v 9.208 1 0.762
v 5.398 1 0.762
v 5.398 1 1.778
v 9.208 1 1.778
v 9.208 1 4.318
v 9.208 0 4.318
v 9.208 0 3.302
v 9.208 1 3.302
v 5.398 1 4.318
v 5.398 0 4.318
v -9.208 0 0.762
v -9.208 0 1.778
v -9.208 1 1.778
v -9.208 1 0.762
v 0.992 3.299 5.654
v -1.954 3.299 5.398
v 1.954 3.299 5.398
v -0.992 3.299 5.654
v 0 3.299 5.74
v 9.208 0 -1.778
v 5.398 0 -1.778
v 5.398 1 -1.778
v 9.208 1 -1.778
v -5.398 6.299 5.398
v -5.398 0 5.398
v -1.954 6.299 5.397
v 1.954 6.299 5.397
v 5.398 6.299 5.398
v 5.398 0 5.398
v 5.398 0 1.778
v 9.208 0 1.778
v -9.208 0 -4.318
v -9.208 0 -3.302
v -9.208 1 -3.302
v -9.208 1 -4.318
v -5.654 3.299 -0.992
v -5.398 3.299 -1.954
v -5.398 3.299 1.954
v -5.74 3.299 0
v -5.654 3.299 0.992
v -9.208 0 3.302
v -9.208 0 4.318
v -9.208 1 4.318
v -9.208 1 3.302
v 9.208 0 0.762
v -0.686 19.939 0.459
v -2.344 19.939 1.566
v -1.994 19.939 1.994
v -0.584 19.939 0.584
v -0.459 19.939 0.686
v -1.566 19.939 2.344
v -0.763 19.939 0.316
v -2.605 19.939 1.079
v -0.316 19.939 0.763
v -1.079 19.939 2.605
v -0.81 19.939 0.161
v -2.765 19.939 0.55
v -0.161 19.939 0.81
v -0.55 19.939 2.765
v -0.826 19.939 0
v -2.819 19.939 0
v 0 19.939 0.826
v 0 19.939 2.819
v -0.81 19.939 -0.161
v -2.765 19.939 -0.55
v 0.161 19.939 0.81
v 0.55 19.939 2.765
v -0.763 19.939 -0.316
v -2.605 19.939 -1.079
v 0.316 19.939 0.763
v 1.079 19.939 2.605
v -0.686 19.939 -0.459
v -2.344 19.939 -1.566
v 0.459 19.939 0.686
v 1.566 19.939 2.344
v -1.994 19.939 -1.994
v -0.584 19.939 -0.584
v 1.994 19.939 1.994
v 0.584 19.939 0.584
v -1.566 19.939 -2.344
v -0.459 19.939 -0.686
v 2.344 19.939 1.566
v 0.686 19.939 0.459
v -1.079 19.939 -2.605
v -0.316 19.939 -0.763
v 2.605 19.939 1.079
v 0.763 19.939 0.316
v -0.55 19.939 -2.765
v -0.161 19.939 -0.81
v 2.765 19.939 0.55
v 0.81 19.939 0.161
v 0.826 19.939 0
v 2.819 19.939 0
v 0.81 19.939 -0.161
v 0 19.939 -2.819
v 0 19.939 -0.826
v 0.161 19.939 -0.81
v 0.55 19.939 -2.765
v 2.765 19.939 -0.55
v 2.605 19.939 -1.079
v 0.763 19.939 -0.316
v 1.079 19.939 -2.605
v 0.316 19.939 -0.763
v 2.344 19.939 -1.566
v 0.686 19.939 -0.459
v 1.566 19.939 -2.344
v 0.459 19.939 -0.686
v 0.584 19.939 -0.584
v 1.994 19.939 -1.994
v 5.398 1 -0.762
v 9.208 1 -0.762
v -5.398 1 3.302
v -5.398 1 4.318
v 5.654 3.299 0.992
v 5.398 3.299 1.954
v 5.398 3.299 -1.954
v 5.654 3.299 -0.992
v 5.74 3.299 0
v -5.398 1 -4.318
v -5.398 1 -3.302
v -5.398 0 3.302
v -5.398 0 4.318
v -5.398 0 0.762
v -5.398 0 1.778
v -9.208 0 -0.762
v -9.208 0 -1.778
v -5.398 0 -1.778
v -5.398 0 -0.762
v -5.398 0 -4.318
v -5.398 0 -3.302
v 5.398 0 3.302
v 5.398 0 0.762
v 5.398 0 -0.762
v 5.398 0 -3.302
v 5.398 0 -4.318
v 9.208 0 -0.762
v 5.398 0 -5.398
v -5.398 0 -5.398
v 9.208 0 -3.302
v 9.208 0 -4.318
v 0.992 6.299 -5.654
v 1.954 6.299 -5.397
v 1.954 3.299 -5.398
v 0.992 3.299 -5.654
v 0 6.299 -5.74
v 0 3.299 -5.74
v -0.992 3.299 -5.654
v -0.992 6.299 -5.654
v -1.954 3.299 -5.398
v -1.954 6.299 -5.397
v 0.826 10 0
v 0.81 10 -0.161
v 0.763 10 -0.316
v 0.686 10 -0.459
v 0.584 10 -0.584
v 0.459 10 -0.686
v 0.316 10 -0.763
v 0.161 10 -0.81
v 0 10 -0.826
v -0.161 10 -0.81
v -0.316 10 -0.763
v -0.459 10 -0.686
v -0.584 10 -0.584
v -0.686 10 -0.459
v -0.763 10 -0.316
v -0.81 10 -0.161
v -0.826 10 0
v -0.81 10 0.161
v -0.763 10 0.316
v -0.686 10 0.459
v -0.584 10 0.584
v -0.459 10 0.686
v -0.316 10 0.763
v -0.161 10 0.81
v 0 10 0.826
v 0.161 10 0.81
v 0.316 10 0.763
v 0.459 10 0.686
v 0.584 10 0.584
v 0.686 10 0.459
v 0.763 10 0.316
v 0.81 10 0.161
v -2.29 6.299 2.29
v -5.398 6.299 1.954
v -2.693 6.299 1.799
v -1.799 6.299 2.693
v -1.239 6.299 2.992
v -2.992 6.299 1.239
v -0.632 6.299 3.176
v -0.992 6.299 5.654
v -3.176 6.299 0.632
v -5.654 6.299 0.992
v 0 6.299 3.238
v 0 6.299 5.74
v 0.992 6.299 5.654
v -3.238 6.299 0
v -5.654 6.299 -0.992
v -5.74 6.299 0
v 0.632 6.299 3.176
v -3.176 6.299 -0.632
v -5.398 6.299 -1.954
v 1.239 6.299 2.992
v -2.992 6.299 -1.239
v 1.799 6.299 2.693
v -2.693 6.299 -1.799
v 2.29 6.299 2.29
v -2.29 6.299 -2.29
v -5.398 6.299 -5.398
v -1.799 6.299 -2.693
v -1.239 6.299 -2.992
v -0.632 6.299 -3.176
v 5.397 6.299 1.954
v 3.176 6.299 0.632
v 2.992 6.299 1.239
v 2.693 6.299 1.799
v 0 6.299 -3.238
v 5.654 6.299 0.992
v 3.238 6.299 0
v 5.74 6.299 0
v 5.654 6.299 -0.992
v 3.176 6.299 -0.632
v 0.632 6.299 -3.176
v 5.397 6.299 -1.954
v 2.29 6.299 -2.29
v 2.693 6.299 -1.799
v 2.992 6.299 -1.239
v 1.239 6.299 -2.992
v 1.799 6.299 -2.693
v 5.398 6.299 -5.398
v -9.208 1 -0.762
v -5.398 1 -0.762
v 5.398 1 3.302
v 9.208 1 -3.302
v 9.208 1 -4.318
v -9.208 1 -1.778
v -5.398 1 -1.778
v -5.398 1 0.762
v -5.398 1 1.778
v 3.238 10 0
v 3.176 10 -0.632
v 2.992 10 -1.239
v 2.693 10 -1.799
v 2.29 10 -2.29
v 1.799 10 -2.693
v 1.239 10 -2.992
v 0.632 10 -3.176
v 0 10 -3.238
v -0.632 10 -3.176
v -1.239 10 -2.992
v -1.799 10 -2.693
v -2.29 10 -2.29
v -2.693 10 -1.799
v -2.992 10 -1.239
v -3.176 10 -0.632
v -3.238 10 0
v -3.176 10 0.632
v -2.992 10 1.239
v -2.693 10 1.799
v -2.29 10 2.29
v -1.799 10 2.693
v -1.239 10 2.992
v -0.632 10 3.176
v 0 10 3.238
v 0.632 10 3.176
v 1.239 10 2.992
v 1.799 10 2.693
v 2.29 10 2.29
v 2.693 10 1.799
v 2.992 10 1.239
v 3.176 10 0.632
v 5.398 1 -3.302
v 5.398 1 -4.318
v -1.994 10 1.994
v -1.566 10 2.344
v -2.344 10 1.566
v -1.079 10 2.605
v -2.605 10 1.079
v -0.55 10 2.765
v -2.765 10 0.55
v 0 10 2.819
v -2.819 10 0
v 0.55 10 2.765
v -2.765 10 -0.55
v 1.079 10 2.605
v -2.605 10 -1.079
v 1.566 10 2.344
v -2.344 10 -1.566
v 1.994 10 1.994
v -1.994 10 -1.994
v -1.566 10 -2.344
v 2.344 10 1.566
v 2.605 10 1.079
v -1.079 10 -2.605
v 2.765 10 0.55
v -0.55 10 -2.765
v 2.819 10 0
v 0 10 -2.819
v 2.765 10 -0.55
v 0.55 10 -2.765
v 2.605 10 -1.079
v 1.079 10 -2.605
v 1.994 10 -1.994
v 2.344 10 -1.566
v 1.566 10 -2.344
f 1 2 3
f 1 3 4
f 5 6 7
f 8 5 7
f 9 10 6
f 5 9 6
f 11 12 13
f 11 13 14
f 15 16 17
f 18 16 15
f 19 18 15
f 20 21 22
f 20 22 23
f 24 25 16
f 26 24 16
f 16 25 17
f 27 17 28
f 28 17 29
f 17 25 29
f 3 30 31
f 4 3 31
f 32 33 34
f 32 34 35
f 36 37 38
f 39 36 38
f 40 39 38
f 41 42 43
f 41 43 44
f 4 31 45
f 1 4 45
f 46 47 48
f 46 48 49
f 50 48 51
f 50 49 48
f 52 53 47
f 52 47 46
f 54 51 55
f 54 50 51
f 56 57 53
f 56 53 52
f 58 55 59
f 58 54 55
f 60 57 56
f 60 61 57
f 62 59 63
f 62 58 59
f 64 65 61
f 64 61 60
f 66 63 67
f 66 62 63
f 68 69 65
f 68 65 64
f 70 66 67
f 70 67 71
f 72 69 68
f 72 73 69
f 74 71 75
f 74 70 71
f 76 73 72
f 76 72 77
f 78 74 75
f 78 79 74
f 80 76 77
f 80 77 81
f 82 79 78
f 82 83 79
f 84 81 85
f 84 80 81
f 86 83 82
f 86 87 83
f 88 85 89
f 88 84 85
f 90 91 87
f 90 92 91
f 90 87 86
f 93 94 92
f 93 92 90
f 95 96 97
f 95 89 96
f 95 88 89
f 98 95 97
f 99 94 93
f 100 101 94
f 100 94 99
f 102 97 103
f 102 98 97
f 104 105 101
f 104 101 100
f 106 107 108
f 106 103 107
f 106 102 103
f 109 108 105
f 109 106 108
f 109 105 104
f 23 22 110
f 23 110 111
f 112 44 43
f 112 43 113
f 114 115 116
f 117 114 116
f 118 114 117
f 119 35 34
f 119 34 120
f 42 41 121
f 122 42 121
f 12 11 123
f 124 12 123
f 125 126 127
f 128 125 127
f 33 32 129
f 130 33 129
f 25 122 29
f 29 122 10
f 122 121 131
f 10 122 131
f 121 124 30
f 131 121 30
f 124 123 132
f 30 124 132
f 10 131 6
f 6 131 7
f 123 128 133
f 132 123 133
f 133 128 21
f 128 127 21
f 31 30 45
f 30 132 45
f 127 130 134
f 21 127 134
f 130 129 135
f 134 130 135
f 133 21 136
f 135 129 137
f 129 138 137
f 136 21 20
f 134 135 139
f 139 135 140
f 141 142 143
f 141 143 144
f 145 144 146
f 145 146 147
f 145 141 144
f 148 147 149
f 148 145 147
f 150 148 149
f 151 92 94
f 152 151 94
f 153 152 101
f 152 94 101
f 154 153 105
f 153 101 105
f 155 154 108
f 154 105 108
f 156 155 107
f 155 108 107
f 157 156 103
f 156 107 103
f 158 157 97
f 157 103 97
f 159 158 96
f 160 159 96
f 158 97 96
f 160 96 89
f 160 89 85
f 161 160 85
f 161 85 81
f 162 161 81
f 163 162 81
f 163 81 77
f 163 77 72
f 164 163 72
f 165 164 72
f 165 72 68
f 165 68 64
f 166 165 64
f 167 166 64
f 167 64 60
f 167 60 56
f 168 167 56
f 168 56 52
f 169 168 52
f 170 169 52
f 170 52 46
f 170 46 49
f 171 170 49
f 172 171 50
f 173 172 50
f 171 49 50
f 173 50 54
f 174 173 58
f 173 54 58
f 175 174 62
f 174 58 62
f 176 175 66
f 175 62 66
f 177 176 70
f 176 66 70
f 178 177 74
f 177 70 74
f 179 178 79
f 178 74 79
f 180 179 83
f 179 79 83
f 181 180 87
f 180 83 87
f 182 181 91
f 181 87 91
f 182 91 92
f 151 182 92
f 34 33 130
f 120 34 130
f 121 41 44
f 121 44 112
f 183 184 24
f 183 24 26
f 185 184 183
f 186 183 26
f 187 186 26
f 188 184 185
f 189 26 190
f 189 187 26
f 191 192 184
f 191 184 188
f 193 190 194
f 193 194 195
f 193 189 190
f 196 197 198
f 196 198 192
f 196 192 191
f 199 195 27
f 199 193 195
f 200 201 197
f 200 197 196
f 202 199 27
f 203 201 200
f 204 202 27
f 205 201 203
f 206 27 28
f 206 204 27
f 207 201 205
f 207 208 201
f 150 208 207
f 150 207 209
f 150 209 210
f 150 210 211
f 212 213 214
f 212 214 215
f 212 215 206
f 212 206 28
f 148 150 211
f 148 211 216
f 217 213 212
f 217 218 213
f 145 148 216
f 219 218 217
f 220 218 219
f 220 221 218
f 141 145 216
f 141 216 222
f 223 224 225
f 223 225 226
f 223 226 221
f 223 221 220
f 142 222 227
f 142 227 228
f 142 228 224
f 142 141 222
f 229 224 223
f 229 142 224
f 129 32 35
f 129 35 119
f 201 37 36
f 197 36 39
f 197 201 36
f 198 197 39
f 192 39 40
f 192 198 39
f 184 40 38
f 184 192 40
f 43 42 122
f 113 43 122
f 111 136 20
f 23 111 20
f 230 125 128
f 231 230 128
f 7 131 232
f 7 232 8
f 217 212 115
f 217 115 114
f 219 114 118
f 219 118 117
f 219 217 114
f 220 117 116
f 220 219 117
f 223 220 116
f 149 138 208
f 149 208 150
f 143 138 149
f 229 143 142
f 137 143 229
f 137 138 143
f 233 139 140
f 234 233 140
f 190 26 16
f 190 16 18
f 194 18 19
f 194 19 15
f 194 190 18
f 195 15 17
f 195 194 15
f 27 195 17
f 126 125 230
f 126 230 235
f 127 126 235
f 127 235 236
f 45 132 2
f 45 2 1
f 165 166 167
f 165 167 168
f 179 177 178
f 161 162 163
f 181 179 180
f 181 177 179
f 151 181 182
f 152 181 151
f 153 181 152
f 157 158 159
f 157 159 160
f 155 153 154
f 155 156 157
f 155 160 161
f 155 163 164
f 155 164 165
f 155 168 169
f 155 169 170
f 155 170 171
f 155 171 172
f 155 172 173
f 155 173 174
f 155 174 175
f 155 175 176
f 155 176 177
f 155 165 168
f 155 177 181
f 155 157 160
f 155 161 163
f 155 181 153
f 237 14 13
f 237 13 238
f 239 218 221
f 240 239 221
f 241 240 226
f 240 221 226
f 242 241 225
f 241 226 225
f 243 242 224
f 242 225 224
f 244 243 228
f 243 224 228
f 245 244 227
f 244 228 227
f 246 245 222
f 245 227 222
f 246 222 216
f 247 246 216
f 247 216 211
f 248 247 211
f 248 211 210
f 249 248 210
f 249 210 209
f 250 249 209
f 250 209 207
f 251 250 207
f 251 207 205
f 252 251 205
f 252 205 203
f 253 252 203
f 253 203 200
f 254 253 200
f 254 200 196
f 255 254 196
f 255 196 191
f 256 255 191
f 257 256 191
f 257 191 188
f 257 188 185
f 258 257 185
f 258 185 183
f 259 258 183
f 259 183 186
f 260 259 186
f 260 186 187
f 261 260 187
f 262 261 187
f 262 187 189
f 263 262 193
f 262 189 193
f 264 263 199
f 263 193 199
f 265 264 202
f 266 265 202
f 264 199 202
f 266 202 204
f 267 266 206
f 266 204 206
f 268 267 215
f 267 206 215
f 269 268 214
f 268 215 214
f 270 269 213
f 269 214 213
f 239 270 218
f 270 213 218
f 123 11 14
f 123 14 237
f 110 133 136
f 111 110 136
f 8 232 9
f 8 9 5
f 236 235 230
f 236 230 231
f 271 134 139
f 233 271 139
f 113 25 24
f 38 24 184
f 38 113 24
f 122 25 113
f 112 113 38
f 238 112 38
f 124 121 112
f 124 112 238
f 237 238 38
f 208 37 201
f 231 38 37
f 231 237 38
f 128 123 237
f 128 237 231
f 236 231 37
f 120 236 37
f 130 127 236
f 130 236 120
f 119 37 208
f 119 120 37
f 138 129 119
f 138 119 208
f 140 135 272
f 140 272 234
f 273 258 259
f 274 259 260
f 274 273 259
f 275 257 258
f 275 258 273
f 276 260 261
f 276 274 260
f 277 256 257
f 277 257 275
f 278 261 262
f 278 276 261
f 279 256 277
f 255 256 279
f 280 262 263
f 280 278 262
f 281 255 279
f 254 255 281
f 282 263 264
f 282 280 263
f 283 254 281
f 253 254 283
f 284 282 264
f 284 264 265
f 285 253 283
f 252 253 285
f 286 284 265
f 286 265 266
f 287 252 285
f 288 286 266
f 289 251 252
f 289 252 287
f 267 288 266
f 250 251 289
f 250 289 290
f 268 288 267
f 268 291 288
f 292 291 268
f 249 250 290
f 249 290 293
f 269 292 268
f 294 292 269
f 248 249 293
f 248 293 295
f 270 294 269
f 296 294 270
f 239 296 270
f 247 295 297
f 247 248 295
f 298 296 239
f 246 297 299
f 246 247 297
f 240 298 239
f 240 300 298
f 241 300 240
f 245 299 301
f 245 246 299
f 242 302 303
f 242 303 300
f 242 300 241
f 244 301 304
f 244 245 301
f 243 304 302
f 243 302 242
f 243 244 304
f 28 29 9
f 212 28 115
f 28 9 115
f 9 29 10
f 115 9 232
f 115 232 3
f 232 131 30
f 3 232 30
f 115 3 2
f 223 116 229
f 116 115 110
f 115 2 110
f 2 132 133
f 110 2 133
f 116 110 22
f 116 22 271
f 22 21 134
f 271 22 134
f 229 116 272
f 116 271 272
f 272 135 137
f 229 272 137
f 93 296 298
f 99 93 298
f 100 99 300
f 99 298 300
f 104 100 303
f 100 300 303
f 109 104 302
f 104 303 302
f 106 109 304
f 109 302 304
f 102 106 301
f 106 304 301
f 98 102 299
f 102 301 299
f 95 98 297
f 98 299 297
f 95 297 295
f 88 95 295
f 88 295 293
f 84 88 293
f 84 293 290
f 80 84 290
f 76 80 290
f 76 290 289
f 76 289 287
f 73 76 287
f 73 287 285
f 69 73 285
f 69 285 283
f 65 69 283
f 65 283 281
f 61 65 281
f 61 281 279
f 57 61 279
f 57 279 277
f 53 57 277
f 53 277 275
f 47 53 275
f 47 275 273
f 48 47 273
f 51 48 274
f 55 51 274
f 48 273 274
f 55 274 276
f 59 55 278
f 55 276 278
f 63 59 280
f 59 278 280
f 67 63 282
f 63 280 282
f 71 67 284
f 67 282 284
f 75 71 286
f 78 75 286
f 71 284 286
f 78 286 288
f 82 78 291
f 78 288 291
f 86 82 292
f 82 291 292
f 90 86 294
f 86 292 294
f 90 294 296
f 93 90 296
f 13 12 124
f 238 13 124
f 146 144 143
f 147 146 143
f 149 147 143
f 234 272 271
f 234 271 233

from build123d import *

# Parameters (mm, degrees)
SKETCH1_W           = 10.795
SKETCH1_H           = 10.795
BOSS_EXTRUDE1_DEPTH = 6.2992
SKETCH3_R           = 5.7404
BOSS_EXTRUDE2_DEPTH = 3
SKETCH4_R           = 2.8194
BOSS_EXTRUDE3_DEPTH = 19.939
SKETCH5_R           = 0.8255
CUT_EXTRUDE1_DEPTH  = 15
SKETCH7_R           = 3.2385
BOSS_EXTRUDE4_DEPTH = 10
SKETCH8_W           = 4.31
SKETCH8_H           = 1.016
BOSS_EXTRUDE5_DEPTH = 1


with BuildPart() as part:
    # Sketch1 → Boss-Extrude1 (new body)
    with BuildSketch(Plane(origin=(0, 0, 0), x_dir=(1, 0, 0), z_dir=(0, 1, 0))):
        Rectangle(SKETCH1_W, SKETCH1_H)
    extrude(amount=BOSS_EXTRUDE1_DEPTH)

    # Sketch3 → Boss-Extrude2 (add)
    with BuildSketch(Plane(origin=(0, 6.2992, 0), x_dir=(1, 0, 0), z_dir=(0, 1, 0))):
        Circle(SKETCH3_R)
    extrude(amount=-BOSS_EXTRUDE2_DEPTH)

    # Sketch4 → Boss-Extrude3 (add)
    with BuildSketch(Plane(origin=(0, 0, 0), x_dir=(1, 0, 0), z_dir=(0, 1, 0))):
        Circle(SKETCH4_R)
    extrude(amount=BOSS_EXTRUDE3_DEPTH)

    # Sketch5 → Cut-Extrude1 (cut)
    with BuildSketch(Plane(origin=(0, 19.939, 0), x_dir=(1, 0, 0), z_dir=(0, 1, 0))):
        Circle(SKETCH5_R)
    extrude(amount=-CUT_EXTRUDE1_DEPTH, mode=Mode.SUBTRACT)

    # Sketch7 → Boss-Extrude4 (add)
    with BuildSketch(Plane(origin=(0, 0, 0), x_dir=(1, 0, 0), z_dir=(0, 1, 0))):
        Circle(SKETCH7_R)
    extrude(amount=BOSS_EXTRUDE4_DEPTH)

    # Sketch8 → Boss-Extrude5 (add)
    with BuildSketch(Plane(origin=(0, 0, 0), x_dir=(1, 0, 0), z_dir=(0, 1, 0))):
        with Locations((-7.0525, 3.81)):
            Rectangle(SKETCH8_W, SKETCH8_H)
        with Locations((-7.0525, 1.27)):
            Rectangle(SKETCH8_W, SKETCH8_H)
        with Locations((-7.0525, -1.27)):
            Rectangle(SKETCH8_W, SKETCH8_H)
        with Locations((-7.0525, -3.81)):
            Rectangle(SKETCH8_W, SKETCH8_H)
        with Locations((7.0525, -3.81)):
            Rectangle(SKETCH8_W, SKETCH8_H)
        with Locations((7.0525, -1.27)):
            Rectangle(SKETCH8_W, SKETCH8_H)
        with Locations((7.0525, 1.27)):
            Rectangle(SKETCH8_W, SKETCH8_H)
        with Locations((7.0525, 3.81)):
            Rectangle(SKETCH8_W, SKETCH8_H)
    extrude(amount=BOSS_EXTRUDE5_DEPTH)


solid = part.part
